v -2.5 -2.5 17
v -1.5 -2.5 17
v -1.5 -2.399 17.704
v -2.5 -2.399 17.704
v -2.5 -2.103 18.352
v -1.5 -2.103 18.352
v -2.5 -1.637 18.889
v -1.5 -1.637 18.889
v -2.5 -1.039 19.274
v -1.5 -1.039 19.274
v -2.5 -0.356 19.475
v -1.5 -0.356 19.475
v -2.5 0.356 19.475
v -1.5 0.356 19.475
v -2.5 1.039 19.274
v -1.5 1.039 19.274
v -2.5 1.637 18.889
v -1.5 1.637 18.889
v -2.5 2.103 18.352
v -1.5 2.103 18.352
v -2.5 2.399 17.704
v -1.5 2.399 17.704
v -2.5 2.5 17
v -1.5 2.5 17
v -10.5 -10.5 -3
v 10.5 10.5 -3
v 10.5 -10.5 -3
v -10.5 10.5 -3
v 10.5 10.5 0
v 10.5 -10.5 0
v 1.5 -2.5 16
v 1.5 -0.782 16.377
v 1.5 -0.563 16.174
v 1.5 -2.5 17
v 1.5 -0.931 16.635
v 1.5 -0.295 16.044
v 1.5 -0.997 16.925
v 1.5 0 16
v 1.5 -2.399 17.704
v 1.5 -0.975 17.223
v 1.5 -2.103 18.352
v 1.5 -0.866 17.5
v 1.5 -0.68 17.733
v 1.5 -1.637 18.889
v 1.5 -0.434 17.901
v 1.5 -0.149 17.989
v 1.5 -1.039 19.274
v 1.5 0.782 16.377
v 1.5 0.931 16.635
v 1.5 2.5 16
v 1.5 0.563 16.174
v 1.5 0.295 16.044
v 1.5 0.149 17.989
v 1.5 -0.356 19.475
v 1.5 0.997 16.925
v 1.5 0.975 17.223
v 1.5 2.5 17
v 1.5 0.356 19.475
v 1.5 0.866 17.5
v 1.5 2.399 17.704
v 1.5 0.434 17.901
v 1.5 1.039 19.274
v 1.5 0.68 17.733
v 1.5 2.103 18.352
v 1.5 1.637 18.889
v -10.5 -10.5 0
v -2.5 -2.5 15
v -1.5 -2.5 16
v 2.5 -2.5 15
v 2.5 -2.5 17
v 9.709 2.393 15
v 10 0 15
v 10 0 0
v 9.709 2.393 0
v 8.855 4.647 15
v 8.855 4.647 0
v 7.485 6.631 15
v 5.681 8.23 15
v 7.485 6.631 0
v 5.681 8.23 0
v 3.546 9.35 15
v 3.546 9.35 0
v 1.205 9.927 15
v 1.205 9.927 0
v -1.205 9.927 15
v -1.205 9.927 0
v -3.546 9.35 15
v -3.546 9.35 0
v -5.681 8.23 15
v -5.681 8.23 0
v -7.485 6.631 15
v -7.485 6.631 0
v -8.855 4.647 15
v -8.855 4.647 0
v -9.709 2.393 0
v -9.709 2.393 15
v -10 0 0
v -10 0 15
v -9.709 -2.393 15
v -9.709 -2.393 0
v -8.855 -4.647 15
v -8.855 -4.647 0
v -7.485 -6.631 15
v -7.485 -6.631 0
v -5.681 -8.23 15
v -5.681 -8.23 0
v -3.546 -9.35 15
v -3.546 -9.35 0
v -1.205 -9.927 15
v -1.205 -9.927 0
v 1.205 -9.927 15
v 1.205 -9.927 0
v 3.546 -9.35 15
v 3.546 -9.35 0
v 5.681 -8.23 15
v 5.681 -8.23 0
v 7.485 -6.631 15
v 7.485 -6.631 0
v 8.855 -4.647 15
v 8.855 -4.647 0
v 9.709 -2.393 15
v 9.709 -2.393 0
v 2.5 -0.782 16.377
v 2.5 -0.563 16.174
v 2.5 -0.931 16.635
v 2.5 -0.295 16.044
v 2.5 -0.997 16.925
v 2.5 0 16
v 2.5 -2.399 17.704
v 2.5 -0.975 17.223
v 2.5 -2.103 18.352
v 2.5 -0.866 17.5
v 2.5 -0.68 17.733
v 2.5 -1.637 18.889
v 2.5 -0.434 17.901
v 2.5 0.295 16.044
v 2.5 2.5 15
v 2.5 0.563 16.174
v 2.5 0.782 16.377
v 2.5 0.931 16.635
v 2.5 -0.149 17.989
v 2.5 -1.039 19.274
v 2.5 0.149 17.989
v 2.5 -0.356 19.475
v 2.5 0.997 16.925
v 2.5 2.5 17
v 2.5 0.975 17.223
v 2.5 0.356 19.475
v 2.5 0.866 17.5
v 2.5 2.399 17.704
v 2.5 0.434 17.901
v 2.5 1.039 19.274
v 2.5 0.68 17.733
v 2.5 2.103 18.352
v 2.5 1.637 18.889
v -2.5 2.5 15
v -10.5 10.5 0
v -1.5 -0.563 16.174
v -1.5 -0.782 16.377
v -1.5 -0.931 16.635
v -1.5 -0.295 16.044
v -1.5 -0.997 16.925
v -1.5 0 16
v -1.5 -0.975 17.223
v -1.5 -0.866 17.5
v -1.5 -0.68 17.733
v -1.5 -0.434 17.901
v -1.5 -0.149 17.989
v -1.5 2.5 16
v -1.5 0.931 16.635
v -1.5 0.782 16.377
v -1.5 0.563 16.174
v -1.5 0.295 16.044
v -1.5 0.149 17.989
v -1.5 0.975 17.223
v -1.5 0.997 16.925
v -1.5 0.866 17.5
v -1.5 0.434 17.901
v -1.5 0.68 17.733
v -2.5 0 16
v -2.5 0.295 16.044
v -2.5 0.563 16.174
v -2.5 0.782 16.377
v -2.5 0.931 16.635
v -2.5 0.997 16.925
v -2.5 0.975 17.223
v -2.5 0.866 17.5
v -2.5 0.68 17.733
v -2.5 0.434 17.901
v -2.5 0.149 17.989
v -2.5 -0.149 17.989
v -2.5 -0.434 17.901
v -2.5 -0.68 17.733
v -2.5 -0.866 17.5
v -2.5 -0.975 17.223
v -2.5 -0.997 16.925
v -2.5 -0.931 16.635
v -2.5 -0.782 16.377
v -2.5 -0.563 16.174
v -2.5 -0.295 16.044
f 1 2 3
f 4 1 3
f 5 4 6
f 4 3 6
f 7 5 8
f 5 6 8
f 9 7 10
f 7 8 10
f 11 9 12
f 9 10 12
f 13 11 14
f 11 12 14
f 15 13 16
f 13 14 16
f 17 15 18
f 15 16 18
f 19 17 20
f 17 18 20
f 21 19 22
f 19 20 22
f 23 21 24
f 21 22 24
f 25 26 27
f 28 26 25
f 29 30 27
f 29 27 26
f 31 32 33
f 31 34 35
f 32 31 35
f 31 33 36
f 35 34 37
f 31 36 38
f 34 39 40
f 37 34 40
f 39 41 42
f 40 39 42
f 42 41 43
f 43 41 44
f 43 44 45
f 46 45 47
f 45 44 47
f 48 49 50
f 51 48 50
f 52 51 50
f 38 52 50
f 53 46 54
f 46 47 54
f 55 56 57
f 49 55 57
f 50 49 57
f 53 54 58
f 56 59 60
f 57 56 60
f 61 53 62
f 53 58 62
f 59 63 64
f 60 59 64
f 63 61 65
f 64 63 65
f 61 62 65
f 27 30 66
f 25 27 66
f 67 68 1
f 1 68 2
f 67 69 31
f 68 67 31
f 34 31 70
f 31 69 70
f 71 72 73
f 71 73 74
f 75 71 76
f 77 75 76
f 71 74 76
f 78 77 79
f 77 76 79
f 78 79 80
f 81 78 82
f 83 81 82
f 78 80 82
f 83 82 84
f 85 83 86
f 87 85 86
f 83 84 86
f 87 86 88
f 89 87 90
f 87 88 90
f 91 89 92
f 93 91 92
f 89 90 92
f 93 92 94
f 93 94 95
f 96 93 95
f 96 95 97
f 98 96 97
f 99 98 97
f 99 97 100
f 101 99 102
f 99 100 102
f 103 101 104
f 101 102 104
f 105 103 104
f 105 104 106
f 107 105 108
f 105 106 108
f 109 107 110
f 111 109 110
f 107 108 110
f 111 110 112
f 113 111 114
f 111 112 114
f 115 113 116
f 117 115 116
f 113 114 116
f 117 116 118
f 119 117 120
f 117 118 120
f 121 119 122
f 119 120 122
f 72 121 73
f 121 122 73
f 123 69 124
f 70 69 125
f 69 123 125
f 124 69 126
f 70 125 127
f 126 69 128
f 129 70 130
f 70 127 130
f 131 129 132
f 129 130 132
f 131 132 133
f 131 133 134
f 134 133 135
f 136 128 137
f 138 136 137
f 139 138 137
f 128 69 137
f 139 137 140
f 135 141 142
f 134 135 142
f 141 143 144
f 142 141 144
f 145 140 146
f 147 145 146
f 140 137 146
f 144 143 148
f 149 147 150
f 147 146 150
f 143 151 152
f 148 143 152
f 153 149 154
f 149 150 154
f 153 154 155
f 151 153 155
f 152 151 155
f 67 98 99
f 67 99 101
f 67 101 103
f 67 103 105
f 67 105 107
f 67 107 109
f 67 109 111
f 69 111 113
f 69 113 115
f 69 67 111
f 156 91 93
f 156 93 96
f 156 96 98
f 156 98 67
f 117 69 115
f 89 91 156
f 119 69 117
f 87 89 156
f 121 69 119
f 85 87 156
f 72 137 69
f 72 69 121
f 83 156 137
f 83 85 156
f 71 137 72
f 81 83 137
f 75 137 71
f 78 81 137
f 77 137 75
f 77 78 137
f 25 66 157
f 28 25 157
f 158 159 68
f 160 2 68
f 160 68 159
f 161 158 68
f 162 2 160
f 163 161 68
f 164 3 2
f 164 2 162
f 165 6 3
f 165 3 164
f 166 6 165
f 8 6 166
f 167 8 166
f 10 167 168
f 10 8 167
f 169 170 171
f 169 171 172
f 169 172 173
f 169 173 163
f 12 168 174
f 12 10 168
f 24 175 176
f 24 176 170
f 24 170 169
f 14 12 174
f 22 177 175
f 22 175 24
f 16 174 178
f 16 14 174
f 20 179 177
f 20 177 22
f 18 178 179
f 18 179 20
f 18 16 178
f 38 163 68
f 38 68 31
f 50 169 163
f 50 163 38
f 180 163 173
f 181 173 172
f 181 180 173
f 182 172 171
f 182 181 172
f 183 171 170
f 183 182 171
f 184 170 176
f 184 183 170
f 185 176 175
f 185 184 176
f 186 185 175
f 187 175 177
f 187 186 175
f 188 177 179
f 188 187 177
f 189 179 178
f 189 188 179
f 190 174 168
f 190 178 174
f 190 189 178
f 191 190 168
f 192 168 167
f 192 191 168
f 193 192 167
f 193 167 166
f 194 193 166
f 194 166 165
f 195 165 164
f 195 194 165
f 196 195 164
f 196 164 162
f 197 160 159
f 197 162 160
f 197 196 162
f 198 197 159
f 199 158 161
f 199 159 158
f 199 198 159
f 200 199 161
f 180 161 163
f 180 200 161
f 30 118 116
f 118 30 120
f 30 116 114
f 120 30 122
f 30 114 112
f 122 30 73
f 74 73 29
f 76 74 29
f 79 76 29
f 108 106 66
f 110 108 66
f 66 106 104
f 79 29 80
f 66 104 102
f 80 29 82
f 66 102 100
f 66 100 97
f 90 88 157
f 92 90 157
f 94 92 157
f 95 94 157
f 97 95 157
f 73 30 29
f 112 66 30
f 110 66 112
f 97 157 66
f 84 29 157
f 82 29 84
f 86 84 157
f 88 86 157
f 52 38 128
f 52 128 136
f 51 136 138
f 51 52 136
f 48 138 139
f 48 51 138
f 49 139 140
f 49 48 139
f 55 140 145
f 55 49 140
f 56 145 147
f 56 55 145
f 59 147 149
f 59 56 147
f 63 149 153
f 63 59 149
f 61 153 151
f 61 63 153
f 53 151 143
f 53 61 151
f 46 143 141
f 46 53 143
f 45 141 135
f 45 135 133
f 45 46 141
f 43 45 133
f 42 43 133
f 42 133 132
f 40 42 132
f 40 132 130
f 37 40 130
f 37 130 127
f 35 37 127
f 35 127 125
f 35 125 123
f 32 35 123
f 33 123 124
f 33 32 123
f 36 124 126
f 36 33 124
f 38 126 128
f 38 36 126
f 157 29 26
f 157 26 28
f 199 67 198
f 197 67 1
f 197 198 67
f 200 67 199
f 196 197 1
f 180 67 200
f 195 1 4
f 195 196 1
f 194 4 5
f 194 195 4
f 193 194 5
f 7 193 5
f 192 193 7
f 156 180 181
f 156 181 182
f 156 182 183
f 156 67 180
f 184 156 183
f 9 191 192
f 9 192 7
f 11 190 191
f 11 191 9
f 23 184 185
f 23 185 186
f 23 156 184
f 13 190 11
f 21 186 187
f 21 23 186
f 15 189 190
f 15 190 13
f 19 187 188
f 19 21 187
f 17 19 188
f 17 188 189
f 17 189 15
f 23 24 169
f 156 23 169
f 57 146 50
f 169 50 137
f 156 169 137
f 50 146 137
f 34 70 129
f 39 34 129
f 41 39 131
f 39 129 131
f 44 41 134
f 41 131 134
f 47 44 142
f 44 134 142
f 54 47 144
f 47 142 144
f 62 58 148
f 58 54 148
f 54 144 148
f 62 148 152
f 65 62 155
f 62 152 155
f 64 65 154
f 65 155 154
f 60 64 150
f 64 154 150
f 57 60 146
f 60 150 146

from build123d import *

# Parameters (mm, degrees)
SKETCH1_R           = 10
BOSS_EXTRUDE1_DEPTH = 15
SKETCH2_W           = 21
SKETCH2_H           = 21
BOSS_EXTRUDE2_DEPTH = 3
SKETCH3_R           = 1
BOSS_EXTRUDE3_DEPTH = 2.5
SKETCH4_W           = 3
SKETCH4_H           = 5
CUT_EXTRUDE1_DEPTH  = 3.5


with BuildPart() as part:
    # Sketch1 → Boss-Extrude1 (new body)
    with BuildSketch(Plane.XY):
        Circle(SKETCH1_R)
    extrude(amount=BOSS_EXTRUDE1_DEPTH)

    # Sketch2 → Boss-Extrude2 (add)
    with BuildSketch(Plane(origin=(0, 0, 0), x_dir=(-1, 0, 0), z_dir=(0, 0, -1))):
        Rectangle(SKETCH2_W, SKETCH2_H)
    extrude(amount=BOSS_EXTRUDE2_DEPTH)

    # Sketch3 → Boss-Extrude3 (add, symmetric)
    with BuildSketch(Plane(origin=(0, 0, 0), x_dir=(0, 0, -1), z_dir=(1, 0, 0))):
        with BuildLine():
            Line((-15, 2.5), (-15, -2.5))
            Line((-15, -2.5), (-17, -2.5))
            ThreePointArc((-17, -2.5), (-19.5, 0), (-17, 2.5))
            Line((-17, 2.5), (-15, 2.5))
        make_face()
        with Locations((-17, 0)):
            Circle(SKETCH3_R, mode=Mode.SUBTRACT)
    extrude(amount=BOSS_EXTRUDE3_DEPTH, both=True)

    # Sketch4 → Cut-Extrude1 (cut)
    with BuildSketch(Plane.XY.offset(19.5)):
        Rectangle(SKETCH4_W, SKETCH4_H)
    extrude(amount=-CUT_EXTRUDE1_DEPTH, mode=Mode.SUBTRACT)


solid = part.part
